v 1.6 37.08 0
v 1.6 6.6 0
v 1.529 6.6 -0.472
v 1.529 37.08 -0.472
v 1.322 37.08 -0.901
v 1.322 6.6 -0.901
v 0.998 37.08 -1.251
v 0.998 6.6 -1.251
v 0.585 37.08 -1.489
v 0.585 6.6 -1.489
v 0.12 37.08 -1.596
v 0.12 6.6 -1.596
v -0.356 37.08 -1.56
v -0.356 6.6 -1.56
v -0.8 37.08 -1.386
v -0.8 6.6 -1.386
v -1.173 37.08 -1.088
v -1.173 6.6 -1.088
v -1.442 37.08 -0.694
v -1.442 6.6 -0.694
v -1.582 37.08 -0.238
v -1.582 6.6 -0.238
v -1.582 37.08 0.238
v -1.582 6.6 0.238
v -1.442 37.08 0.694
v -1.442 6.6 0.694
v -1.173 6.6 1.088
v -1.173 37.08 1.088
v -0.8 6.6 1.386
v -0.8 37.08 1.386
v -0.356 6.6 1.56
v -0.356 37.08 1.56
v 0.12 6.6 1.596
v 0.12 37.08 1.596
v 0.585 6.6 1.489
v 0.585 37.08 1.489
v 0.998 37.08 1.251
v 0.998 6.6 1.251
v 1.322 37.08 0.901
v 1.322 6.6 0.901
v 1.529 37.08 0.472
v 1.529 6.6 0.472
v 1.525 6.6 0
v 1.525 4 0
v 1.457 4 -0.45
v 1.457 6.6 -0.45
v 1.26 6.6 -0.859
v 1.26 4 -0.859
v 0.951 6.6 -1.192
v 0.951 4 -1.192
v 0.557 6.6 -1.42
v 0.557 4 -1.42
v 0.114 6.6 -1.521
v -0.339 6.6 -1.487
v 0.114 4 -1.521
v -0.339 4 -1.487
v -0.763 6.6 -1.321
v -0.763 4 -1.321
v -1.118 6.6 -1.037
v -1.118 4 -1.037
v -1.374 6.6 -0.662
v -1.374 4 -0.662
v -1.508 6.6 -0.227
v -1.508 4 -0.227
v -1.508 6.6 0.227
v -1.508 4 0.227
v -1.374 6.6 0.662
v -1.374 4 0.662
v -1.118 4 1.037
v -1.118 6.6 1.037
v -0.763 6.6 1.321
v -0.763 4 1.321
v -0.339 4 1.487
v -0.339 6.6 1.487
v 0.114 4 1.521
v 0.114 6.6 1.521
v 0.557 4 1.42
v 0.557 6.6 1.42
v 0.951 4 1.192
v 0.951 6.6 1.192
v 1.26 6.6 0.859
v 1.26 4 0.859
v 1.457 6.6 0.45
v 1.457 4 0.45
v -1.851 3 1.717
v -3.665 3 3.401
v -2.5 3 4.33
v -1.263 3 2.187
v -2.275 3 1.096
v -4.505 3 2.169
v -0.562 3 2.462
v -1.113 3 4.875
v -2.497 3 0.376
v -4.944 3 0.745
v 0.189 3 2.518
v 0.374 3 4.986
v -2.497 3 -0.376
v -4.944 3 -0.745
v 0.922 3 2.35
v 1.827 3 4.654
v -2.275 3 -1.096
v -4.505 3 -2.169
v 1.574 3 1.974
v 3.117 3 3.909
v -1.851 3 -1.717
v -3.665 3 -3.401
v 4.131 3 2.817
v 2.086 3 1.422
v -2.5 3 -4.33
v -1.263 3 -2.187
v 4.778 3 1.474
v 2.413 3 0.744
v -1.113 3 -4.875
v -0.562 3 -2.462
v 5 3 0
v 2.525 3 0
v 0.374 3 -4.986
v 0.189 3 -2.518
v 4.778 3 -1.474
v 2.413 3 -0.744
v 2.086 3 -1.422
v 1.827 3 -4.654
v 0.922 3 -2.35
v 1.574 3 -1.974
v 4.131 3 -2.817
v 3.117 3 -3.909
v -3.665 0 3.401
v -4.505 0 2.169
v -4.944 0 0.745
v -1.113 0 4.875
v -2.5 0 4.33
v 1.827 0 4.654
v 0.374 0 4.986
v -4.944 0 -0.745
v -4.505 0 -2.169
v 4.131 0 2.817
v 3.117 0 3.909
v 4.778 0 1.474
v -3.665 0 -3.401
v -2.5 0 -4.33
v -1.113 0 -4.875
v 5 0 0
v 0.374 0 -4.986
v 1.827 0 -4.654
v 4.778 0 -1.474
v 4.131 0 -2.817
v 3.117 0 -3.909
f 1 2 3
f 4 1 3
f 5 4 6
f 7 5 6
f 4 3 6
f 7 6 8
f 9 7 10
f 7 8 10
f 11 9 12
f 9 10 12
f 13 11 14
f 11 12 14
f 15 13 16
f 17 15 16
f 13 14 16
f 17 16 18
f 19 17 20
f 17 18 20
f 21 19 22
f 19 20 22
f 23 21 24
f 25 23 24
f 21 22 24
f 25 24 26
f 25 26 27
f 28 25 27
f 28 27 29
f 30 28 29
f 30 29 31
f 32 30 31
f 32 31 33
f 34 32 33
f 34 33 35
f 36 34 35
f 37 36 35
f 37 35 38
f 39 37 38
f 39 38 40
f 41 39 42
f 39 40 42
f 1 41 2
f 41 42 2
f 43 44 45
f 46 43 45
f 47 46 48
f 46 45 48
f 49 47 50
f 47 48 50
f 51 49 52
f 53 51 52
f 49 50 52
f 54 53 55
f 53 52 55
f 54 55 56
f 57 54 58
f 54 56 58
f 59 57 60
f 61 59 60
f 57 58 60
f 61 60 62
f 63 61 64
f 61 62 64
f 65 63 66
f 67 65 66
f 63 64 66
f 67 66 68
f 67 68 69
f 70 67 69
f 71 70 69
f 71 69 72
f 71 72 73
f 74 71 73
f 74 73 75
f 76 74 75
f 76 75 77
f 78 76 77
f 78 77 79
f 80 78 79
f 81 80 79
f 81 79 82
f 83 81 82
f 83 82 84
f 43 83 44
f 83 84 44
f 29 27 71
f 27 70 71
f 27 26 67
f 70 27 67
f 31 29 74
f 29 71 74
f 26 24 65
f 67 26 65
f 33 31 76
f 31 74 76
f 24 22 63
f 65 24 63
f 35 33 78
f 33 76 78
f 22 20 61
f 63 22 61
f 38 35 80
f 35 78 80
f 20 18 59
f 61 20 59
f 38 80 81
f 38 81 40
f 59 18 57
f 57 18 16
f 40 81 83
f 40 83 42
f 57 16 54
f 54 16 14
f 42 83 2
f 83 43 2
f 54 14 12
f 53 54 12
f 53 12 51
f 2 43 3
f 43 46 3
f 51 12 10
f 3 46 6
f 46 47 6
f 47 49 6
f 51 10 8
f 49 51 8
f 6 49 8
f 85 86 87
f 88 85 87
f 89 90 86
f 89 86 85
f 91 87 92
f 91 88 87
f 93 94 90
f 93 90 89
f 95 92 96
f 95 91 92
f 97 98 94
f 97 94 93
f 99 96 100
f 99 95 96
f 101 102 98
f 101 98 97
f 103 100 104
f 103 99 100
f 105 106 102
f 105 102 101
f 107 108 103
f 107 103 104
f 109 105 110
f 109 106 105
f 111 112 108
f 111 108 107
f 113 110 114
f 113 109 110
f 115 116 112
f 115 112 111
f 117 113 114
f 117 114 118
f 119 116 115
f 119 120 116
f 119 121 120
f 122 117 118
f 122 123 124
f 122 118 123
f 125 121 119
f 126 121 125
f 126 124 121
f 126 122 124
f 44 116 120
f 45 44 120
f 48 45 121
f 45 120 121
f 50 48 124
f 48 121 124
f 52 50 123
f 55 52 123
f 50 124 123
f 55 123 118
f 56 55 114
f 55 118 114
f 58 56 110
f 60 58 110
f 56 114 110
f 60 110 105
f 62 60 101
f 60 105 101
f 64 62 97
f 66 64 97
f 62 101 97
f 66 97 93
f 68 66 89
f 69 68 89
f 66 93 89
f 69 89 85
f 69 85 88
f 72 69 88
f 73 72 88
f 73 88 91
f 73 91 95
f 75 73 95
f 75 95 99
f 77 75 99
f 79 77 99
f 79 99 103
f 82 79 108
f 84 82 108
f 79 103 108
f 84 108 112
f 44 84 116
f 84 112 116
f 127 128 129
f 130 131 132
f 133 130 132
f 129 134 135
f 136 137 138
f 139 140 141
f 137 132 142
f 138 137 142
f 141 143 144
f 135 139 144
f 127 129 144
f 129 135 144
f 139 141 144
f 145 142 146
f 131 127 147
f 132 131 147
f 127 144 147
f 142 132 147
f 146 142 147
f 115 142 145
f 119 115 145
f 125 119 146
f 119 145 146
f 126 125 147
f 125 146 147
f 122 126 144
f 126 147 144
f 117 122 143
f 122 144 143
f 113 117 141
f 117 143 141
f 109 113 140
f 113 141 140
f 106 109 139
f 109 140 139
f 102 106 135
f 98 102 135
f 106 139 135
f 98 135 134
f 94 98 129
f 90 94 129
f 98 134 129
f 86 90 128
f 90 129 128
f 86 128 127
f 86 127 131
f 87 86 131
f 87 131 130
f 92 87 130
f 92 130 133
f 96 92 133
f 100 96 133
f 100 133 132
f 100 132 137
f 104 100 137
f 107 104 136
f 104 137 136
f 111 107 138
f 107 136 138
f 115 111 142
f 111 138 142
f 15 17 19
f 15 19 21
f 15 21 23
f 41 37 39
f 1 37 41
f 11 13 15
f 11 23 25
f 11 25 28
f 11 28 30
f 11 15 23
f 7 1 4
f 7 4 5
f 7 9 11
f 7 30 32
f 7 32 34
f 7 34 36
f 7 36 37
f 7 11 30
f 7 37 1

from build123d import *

# Parameters (mm, degrees)
SKETCH_1_R      = 5
EXTRUDE_1_DEPTH = 3
EXTRUDE_START   = 3
SKETCH_1_3_R    = 1.525
EXTRUDE_2_DEPTH = 3.6
EXTRUDE_START_2 = 6.6
SKETCH_1_4_R    = 1.6
EXTRUDE_3_DEPTH = 30.48
CHAMFER_1_SIZE  = 1


with BuildPart() as part:
    # 草图1 → 凸台-拉伸1 (new body)
    with BuildSketch(Plane(origin=(0, 0, 0), x_dir=(1, 0, 0), z_dir=(0, 1, 0))):
        Circle(SKETCH_1_R)
    extrude(amount=EXTRUDE_1_DEPTH)

    # 草图1<3> → 凸台-拉伸2 (add)
    with BuildSketch(Plane(origin=(0, 0, 0), x_dir=(1, 0, 0), z_dir=(0, 1, 0)).offset(EXTRUDE_START)):
        Circle(SKETCH_1_3_R)
    extrude(amount=EXTRUDE_2_DEPTH)

    # 草图1<4> → 凸台-拉伸3 (add)
    with BuildSketch(Plane(origin=(0, 0, 0), x_dir=(1, 0, 0), z_dir=(0, 1, 0)).offset(EXTRUDE_START_2)):
        Circle(SKETCH_1_4_R)
    extrude(amount=EXTRUDE_3_DEPTH)

    # 倒角1
    chamfer_1_edges = [part.edges().sort_by_distance(p)[0] for p in [
        (-1.525, 3, 0),
    ]]
    chamfer(chamfer_1_edges, length=CHAMFER_1_SIZE)


solid = part.part
